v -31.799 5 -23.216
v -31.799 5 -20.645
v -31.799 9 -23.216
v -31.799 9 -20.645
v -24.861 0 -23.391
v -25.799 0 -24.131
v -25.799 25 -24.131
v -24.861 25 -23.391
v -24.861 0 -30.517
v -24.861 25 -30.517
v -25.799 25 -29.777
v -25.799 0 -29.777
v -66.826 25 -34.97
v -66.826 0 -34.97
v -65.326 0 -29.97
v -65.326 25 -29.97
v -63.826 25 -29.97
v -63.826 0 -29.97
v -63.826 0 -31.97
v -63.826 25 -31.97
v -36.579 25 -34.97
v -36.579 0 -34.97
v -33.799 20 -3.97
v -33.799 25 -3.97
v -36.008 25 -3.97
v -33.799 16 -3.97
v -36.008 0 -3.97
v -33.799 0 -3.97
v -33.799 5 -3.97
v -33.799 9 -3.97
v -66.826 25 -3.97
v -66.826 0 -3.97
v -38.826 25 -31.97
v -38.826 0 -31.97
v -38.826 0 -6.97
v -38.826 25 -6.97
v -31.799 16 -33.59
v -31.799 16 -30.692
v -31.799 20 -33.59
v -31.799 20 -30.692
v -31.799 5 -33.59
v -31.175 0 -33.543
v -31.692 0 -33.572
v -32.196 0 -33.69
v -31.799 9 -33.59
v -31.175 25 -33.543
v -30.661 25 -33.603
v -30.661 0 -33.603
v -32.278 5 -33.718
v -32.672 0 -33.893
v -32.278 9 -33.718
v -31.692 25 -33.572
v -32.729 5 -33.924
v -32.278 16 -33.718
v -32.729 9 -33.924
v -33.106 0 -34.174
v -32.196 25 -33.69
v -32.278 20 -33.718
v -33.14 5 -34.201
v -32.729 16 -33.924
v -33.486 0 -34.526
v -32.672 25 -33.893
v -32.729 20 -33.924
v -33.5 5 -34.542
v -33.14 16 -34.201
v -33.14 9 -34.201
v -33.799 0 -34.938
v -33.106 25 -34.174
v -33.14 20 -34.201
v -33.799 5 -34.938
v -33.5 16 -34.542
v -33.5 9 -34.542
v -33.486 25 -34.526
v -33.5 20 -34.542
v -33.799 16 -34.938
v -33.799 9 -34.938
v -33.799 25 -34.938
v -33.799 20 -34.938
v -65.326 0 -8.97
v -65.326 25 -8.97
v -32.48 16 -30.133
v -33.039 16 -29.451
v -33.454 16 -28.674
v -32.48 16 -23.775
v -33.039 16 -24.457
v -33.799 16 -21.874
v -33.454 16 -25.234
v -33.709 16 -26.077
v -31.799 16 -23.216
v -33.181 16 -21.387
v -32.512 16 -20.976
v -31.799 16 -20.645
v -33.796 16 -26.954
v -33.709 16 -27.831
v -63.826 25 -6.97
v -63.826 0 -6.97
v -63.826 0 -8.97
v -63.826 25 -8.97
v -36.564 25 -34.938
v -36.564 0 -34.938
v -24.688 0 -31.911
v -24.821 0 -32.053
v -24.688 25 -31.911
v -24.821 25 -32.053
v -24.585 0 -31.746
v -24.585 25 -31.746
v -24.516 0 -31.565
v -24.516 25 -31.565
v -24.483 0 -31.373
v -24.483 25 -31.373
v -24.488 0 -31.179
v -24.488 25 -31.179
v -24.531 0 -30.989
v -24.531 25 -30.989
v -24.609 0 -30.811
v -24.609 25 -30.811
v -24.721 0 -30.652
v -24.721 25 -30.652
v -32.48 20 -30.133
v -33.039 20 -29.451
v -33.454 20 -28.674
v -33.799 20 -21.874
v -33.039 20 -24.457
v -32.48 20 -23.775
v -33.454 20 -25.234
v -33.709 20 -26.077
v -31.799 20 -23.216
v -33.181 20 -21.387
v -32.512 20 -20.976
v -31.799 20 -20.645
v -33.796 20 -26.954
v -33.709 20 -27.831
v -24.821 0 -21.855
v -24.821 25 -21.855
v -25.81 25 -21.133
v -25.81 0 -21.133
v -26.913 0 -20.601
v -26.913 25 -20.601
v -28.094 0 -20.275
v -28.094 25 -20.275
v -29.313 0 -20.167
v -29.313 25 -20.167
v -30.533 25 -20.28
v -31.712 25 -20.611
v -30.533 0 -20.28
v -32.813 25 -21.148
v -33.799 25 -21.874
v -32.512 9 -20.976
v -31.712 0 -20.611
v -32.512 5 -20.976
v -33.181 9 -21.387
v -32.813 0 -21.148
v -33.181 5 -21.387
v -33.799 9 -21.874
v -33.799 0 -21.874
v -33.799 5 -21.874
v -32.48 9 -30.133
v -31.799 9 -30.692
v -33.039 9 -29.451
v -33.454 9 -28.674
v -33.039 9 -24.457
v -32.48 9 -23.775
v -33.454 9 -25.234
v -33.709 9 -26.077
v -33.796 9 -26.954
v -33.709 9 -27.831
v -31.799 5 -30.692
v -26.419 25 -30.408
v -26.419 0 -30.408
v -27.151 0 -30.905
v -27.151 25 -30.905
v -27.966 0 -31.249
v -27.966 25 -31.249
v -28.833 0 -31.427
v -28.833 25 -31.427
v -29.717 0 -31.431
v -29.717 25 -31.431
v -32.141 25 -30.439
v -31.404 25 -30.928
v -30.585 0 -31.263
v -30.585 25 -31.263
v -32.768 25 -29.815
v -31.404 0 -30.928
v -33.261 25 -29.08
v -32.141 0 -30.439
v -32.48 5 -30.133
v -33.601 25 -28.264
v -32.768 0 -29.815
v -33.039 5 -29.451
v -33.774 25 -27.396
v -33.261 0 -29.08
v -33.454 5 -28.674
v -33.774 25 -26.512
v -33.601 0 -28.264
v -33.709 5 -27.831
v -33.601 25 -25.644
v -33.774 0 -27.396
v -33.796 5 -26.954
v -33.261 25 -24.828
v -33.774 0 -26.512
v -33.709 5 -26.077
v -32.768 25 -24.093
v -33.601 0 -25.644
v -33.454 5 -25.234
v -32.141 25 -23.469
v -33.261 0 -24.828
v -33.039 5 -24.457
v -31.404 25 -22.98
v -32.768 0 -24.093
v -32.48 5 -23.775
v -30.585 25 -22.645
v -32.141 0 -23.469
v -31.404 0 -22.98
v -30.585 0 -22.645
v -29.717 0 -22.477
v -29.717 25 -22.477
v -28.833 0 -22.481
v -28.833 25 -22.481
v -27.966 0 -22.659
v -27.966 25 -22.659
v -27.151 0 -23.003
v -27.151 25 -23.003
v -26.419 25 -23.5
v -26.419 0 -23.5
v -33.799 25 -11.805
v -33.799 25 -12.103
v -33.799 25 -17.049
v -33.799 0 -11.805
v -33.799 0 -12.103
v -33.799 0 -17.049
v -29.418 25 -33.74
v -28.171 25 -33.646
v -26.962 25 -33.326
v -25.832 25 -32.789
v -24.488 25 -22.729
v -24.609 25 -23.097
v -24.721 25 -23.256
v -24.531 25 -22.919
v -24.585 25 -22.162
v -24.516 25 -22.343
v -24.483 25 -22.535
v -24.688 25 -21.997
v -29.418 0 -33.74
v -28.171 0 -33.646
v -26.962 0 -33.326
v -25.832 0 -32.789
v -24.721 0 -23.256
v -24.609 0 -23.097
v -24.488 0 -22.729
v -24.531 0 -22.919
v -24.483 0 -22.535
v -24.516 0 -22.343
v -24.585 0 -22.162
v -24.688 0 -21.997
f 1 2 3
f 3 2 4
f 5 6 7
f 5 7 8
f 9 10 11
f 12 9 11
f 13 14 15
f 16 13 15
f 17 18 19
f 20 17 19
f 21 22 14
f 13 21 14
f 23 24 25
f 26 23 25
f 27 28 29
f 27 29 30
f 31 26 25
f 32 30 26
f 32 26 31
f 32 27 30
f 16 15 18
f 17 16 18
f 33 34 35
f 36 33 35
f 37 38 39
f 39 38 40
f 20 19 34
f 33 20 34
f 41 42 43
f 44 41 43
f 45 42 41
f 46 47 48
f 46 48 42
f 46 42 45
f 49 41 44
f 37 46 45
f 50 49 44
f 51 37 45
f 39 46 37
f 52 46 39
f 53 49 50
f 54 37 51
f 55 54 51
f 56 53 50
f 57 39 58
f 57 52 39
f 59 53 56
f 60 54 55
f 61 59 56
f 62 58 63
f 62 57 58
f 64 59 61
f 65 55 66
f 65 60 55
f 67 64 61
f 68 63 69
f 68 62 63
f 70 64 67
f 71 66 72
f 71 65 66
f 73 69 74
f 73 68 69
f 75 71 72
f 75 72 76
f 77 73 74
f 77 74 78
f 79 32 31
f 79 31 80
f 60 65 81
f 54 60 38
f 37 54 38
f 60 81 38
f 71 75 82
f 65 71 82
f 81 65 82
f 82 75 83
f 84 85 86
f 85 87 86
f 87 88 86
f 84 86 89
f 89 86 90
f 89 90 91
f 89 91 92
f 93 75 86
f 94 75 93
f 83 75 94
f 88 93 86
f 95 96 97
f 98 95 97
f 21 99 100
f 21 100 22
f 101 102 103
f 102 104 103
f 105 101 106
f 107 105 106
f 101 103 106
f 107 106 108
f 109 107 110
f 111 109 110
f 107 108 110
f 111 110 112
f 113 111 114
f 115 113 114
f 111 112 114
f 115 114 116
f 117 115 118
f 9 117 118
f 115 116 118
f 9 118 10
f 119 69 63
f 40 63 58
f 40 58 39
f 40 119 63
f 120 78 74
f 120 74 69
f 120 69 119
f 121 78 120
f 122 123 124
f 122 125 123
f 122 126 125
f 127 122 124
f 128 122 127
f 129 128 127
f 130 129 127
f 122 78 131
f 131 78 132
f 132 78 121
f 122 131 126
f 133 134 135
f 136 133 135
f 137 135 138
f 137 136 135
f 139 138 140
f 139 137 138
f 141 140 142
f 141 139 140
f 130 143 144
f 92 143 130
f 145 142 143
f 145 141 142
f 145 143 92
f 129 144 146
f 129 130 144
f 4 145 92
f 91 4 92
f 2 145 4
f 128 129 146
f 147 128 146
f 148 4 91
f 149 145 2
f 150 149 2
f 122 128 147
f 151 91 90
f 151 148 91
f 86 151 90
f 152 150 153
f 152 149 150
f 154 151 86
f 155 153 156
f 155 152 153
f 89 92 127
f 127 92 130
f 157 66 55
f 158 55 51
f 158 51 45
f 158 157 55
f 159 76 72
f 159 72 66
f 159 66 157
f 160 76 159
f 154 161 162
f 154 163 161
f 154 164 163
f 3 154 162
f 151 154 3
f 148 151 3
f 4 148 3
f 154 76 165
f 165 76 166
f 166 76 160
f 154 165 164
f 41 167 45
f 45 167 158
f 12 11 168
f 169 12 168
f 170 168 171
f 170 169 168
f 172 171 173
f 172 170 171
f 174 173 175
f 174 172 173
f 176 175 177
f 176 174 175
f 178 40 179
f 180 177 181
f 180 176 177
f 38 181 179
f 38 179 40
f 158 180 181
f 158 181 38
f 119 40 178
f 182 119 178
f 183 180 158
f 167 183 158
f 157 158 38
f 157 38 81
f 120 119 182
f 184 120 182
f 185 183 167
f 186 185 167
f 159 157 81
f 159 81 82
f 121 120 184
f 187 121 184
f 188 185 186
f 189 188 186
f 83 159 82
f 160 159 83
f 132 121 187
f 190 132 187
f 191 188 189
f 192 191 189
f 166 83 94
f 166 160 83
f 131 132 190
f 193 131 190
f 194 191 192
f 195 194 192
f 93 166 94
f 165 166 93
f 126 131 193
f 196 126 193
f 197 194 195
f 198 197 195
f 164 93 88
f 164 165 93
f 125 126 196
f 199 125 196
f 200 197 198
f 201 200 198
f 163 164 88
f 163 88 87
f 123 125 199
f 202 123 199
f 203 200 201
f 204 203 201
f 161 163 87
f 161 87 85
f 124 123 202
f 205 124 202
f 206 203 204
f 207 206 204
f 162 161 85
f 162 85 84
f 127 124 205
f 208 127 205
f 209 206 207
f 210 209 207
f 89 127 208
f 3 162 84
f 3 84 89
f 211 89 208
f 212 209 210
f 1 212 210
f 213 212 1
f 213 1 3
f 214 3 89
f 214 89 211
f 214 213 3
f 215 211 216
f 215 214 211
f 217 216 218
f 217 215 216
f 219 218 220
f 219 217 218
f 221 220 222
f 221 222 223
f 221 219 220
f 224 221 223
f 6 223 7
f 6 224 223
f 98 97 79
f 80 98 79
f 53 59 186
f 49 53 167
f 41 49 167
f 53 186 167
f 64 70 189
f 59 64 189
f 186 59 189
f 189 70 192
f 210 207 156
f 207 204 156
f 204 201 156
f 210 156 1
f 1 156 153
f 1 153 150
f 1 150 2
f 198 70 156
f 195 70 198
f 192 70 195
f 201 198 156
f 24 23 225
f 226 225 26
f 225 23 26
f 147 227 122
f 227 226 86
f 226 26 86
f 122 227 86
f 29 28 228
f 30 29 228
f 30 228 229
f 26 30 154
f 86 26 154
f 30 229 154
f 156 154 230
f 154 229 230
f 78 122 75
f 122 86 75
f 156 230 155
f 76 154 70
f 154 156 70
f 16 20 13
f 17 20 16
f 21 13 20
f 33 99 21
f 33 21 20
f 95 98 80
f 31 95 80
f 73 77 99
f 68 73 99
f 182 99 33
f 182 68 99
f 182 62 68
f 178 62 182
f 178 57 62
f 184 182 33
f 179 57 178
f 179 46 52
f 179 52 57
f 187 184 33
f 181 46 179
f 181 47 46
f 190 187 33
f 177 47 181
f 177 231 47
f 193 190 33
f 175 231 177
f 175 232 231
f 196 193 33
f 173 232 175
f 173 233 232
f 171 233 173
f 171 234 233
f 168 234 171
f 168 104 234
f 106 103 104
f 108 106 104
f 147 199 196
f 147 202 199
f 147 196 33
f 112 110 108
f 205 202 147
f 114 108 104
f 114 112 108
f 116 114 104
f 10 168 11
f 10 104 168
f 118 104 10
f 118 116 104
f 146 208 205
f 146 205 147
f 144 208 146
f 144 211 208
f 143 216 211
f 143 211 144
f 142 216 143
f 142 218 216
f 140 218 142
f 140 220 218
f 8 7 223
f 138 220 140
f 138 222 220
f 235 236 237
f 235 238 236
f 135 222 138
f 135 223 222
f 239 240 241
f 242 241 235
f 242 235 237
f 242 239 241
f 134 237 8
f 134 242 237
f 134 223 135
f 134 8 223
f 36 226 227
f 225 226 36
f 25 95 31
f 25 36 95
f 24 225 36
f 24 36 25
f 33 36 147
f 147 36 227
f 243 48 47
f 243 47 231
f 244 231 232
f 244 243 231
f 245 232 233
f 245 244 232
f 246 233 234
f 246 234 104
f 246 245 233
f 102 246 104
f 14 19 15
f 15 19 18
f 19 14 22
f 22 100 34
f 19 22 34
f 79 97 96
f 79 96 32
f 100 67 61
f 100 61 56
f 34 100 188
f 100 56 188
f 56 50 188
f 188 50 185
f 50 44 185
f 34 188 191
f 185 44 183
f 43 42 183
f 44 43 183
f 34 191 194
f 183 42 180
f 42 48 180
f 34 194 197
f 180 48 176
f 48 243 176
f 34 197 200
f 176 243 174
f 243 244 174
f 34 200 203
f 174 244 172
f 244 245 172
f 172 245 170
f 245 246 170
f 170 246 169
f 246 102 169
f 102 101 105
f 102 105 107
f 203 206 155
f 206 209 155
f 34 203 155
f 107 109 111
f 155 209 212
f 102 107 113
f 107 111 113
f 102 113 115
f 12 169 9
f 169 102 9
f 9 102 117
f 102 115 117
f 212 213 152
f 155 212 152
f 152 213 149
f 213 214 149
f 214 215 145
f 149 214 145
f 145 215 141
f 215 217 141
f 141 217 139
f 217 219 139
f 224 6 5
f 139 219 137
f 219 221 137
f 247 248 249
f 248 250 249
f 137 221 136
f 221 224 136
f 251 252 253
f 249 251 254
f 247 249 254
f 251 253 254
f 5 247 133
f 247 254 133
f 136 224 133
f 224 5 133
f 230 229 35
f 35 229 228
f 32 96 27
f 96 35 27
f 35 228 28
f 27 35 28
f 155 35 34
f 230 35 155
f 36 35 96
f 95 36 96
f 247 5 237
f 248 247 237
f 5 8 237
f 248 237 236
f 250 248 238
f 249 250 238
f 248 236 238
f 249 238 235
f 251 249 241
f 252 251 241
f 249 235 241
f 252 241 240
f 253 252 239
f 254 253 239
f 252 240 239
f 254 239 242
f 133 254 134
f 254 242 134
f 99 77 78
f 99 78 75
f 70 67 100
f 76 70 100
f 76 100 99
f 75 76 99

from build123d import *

# Parameters (mm, degrees)
EXTRUDE_1_DEPTH      = 25
CUT_EXTRUDE_4_DEPTH  = 80.457942189
SKETCH_7_W           = 16.60831278
SKETCH_7_H           = 38.473598513
CUT_EXTRUDE_14_DEPTH = 80.457942189
SKETCH_8_W           = 5
SKETCH_8_H           = 30.968526609
EXTRUDE_2_DEPTH      = 25
EXTRUDE_3_DEPTH      = 25
FILLET_2_R           = 3
FILLET_4_R           = 1
SKETCH_10_W          = 2
SKETCH_10_H          = 4
CUT_EXTRUDE_15_DEPTH = 78.792556685
SKETCH_11_W          = 10.357145721
SKETCH_11_H          = 16.019748685
CUT_EXTRUDE_16_DEPTH = 80.457942189


with BuildPart() as part:
    # Эскиз1 → Бобышка-Вытянуть1 (new body)
    with BuildSketch(Plane(origin=(0, 0, 0), x_dir=(1, 0, 0), z_dir=(0, 1, 0))):
        Polygon((-66.825757576, 34.969739794), (-66.825757576, 29.969739794), (-63.825757576, 29.969739794), (-63.825757576, 31.969739794), (-38.825757576, 31.969739794), (-38.825757576, 6.969739794), (-63.825757576, 6.969739794), (-63.825757576, 8.969739794), (-66.825757576, 8.969739794), (-66.825757576, 3.969739794), (-22.123470102, 3.969739794), (-36.579007505, 34.969739794), align=None)
    extrude(amount=EXTRUDE_1_DEPTH)

    # Эскиз3 → Вырез-Вытянуть4 (cut, through all)
    with BuildSketch(Plane.XZ):
        Polygon((-66.825757576, -3.969739794), (-65.325757576, -8.969739794), (-66.825757576, -8.969739794), align=None)
        Polygon((-66.825757576, -29.969739794), (-66.825757576, -34.969739794), (-65.325757576, -29.969739794), align=None)
    extrude(amount=-CUT_EXTRUDE_4_DEPTH, mode=Mode.SUBTRACT)

    # Эскиз7 → Вырез-Вытянуть14 (cut, through all)
    with BuildSketch(Plane(origin=(0, 0, 0), x_dir=(-1, 0, 0), z_dir=(0, -1, 0))):
        with Locations((27.703474463, 20.539743139)):
            Rectangle(SKETCH_7_W, SKETCH_7_H)
    extrude(amount=-CUT_EXTRUDE_14_DEPTH, mode=Mode.SUBTRACT)

    # Эскиз8 → Бобышка-Вытянуть2 (add)
    with BuildSketch(Plane(origin=(0, 0, 0), x_dir=(-1, 0, 0), z_dir=(0, -1, 0))):
        with Locations((36.298943925, 19.454003098)):
            Rectangle(SKETCH_8_W, SKETCH_8_H)
    extrude(amount=-EXTRUDE_2_DEPTH)

    # Эскиз9 → Бобышка-Вытянуть3 (add)
    with BuildSketch(Plane.XZ):
        with BuildLine():
            Line((-25.798943925, -9.121669553), (-24.000865345, -7.695483003))
            ThreePointArc((-24.000865345, -7.695483003), (-36.096342696, -11.954003099), (-24.000865345, -16.212523195))
            Line((-24.000865345, -16.212523195), (-25.798943925, -14.786336644))
            ThreePointArc((-25.798943925, -14.786336644), (-33.80140029, -11.954003099), (-25.798943925, -9.121669553))
        make_face()
        with BuildLine():
            Line((-25.798943925, -24.130682885), (-24.000865345, -22.7126007))
            ThreePointArc((-24.000865345, -22.7126007), (-36.0856317, -26.954003099), (-24.000865345, -31.195405497))
            Line((-24.000865345, -31.195405497), (-25.798943925, -29.777323313))
            ThreePointArc((-25.798943925, -29.777323313), (-33.795735785, -26.954003099), (-25.798943925, -24.130682885))
        make_face()
    extrude(amount=-EXTRUDE_3_DEPTH)

    # Скругление2
    # the kernel refuses this fillet: 3 mm, written as the material it adds along each edge
    with BuildSketch(Plane(origin=(-33.798943925, 25, -6.859434417), x_dir=(0, 0, 1), z_dir=(0, -1, 0))) as fillet_2_piece_1:
        with BuildLine():
            CenterArc((4.502629254, -2.529514158), FILLET_2_R, 122.523458888, 69.079199353)
            Line((1.563931496, -3.132884263), (1.505157541, -3.144951665))
            ThreePointArc((1.505157541, -3.144951665), (0.933475042, -1.490808901), (-0.044969279, -0.039721077))
            Line((-0.044969279, -0.039721077), (0, 0.06))
            ThreePointArc((0, 0.06), (1.444847312, 0.06), (2.85743593, 0.050590283))
            Line((2.85743593, 0.050590283), (2.889694623, 0))
        make_face()
    extrude(amount=25)
    with BuildSketch(Plane(origin=(-33.798943925, 25, -32.034271886), x_dir=(0, 0, -1), z_dir=(0, -1, 0))) as fillet_2_piece_2:
        with BuildLine():
            CenterArc((4.507255062, 2.535656843), FILLET_2_R, 168.421178081, 69.274223823)
            Line((1.568306542, 3.137804332), (1.509527572, 3.149847282))
            ThreePointArc((1.509527572, 3.149847282), (0.936720457, 1.492647534), (-0.044913828, 0.039783766))
            Line((-0.044913828, 0.039783766), (0, -0.06))
            ThreePointArc((0, -0.06), (1.451997259, -0.06), (2.871929307, -0.050713137))
            Line((2.871929307, -0.050713137), (2.903994517, 0))
        make_face()
    extrude(amount=25)

    # Скругление4
    fillet_4_edges = [part.edges().sort_by_distance(p)[0] for p in [
        (-24.000865345, 12.5, -7.695483003),
        (-24.000865345, 12.5, -16.212523195),
        (-24.000865345, 12.5, -22.7126007),
        (-24.000865345, 12.5, -31.195405497),
    ]]
    fillet(fillet_4_edges, radius=FILLET_4_R)

    # Эскиз10 → Вырез-Вытянуть15 (cut, through all)
    with BuildSketch(Plane.XY.offset(-3.969739794)):
        with Locations((-32.798943925, 18)):
            Rectangle(SKETCH_10_W, SKETCH_10_H)
        with Locations((-32.798943925, 7)):
            Rectangle(SKETCH_10_W, SKETCH_10_H)
    extrude(amount=-CUT_EXTRUDE_15_DEPTH, mode=Mode.SUBTRACT)

    # Эскиз11 → Вырез-Вытянуть16 (cut, through all)
    with BuildSketch(Plane.XZ):
        with Locations((-28.620371065, -11.979614137)):
            Rectangle(SKETCH_11_W, SKETCH_11_H)
    extrude(amount=-CUT_EXTRUDE_16_DEPTH, mode=Mode.SUBTRACT)


solid = part.part
